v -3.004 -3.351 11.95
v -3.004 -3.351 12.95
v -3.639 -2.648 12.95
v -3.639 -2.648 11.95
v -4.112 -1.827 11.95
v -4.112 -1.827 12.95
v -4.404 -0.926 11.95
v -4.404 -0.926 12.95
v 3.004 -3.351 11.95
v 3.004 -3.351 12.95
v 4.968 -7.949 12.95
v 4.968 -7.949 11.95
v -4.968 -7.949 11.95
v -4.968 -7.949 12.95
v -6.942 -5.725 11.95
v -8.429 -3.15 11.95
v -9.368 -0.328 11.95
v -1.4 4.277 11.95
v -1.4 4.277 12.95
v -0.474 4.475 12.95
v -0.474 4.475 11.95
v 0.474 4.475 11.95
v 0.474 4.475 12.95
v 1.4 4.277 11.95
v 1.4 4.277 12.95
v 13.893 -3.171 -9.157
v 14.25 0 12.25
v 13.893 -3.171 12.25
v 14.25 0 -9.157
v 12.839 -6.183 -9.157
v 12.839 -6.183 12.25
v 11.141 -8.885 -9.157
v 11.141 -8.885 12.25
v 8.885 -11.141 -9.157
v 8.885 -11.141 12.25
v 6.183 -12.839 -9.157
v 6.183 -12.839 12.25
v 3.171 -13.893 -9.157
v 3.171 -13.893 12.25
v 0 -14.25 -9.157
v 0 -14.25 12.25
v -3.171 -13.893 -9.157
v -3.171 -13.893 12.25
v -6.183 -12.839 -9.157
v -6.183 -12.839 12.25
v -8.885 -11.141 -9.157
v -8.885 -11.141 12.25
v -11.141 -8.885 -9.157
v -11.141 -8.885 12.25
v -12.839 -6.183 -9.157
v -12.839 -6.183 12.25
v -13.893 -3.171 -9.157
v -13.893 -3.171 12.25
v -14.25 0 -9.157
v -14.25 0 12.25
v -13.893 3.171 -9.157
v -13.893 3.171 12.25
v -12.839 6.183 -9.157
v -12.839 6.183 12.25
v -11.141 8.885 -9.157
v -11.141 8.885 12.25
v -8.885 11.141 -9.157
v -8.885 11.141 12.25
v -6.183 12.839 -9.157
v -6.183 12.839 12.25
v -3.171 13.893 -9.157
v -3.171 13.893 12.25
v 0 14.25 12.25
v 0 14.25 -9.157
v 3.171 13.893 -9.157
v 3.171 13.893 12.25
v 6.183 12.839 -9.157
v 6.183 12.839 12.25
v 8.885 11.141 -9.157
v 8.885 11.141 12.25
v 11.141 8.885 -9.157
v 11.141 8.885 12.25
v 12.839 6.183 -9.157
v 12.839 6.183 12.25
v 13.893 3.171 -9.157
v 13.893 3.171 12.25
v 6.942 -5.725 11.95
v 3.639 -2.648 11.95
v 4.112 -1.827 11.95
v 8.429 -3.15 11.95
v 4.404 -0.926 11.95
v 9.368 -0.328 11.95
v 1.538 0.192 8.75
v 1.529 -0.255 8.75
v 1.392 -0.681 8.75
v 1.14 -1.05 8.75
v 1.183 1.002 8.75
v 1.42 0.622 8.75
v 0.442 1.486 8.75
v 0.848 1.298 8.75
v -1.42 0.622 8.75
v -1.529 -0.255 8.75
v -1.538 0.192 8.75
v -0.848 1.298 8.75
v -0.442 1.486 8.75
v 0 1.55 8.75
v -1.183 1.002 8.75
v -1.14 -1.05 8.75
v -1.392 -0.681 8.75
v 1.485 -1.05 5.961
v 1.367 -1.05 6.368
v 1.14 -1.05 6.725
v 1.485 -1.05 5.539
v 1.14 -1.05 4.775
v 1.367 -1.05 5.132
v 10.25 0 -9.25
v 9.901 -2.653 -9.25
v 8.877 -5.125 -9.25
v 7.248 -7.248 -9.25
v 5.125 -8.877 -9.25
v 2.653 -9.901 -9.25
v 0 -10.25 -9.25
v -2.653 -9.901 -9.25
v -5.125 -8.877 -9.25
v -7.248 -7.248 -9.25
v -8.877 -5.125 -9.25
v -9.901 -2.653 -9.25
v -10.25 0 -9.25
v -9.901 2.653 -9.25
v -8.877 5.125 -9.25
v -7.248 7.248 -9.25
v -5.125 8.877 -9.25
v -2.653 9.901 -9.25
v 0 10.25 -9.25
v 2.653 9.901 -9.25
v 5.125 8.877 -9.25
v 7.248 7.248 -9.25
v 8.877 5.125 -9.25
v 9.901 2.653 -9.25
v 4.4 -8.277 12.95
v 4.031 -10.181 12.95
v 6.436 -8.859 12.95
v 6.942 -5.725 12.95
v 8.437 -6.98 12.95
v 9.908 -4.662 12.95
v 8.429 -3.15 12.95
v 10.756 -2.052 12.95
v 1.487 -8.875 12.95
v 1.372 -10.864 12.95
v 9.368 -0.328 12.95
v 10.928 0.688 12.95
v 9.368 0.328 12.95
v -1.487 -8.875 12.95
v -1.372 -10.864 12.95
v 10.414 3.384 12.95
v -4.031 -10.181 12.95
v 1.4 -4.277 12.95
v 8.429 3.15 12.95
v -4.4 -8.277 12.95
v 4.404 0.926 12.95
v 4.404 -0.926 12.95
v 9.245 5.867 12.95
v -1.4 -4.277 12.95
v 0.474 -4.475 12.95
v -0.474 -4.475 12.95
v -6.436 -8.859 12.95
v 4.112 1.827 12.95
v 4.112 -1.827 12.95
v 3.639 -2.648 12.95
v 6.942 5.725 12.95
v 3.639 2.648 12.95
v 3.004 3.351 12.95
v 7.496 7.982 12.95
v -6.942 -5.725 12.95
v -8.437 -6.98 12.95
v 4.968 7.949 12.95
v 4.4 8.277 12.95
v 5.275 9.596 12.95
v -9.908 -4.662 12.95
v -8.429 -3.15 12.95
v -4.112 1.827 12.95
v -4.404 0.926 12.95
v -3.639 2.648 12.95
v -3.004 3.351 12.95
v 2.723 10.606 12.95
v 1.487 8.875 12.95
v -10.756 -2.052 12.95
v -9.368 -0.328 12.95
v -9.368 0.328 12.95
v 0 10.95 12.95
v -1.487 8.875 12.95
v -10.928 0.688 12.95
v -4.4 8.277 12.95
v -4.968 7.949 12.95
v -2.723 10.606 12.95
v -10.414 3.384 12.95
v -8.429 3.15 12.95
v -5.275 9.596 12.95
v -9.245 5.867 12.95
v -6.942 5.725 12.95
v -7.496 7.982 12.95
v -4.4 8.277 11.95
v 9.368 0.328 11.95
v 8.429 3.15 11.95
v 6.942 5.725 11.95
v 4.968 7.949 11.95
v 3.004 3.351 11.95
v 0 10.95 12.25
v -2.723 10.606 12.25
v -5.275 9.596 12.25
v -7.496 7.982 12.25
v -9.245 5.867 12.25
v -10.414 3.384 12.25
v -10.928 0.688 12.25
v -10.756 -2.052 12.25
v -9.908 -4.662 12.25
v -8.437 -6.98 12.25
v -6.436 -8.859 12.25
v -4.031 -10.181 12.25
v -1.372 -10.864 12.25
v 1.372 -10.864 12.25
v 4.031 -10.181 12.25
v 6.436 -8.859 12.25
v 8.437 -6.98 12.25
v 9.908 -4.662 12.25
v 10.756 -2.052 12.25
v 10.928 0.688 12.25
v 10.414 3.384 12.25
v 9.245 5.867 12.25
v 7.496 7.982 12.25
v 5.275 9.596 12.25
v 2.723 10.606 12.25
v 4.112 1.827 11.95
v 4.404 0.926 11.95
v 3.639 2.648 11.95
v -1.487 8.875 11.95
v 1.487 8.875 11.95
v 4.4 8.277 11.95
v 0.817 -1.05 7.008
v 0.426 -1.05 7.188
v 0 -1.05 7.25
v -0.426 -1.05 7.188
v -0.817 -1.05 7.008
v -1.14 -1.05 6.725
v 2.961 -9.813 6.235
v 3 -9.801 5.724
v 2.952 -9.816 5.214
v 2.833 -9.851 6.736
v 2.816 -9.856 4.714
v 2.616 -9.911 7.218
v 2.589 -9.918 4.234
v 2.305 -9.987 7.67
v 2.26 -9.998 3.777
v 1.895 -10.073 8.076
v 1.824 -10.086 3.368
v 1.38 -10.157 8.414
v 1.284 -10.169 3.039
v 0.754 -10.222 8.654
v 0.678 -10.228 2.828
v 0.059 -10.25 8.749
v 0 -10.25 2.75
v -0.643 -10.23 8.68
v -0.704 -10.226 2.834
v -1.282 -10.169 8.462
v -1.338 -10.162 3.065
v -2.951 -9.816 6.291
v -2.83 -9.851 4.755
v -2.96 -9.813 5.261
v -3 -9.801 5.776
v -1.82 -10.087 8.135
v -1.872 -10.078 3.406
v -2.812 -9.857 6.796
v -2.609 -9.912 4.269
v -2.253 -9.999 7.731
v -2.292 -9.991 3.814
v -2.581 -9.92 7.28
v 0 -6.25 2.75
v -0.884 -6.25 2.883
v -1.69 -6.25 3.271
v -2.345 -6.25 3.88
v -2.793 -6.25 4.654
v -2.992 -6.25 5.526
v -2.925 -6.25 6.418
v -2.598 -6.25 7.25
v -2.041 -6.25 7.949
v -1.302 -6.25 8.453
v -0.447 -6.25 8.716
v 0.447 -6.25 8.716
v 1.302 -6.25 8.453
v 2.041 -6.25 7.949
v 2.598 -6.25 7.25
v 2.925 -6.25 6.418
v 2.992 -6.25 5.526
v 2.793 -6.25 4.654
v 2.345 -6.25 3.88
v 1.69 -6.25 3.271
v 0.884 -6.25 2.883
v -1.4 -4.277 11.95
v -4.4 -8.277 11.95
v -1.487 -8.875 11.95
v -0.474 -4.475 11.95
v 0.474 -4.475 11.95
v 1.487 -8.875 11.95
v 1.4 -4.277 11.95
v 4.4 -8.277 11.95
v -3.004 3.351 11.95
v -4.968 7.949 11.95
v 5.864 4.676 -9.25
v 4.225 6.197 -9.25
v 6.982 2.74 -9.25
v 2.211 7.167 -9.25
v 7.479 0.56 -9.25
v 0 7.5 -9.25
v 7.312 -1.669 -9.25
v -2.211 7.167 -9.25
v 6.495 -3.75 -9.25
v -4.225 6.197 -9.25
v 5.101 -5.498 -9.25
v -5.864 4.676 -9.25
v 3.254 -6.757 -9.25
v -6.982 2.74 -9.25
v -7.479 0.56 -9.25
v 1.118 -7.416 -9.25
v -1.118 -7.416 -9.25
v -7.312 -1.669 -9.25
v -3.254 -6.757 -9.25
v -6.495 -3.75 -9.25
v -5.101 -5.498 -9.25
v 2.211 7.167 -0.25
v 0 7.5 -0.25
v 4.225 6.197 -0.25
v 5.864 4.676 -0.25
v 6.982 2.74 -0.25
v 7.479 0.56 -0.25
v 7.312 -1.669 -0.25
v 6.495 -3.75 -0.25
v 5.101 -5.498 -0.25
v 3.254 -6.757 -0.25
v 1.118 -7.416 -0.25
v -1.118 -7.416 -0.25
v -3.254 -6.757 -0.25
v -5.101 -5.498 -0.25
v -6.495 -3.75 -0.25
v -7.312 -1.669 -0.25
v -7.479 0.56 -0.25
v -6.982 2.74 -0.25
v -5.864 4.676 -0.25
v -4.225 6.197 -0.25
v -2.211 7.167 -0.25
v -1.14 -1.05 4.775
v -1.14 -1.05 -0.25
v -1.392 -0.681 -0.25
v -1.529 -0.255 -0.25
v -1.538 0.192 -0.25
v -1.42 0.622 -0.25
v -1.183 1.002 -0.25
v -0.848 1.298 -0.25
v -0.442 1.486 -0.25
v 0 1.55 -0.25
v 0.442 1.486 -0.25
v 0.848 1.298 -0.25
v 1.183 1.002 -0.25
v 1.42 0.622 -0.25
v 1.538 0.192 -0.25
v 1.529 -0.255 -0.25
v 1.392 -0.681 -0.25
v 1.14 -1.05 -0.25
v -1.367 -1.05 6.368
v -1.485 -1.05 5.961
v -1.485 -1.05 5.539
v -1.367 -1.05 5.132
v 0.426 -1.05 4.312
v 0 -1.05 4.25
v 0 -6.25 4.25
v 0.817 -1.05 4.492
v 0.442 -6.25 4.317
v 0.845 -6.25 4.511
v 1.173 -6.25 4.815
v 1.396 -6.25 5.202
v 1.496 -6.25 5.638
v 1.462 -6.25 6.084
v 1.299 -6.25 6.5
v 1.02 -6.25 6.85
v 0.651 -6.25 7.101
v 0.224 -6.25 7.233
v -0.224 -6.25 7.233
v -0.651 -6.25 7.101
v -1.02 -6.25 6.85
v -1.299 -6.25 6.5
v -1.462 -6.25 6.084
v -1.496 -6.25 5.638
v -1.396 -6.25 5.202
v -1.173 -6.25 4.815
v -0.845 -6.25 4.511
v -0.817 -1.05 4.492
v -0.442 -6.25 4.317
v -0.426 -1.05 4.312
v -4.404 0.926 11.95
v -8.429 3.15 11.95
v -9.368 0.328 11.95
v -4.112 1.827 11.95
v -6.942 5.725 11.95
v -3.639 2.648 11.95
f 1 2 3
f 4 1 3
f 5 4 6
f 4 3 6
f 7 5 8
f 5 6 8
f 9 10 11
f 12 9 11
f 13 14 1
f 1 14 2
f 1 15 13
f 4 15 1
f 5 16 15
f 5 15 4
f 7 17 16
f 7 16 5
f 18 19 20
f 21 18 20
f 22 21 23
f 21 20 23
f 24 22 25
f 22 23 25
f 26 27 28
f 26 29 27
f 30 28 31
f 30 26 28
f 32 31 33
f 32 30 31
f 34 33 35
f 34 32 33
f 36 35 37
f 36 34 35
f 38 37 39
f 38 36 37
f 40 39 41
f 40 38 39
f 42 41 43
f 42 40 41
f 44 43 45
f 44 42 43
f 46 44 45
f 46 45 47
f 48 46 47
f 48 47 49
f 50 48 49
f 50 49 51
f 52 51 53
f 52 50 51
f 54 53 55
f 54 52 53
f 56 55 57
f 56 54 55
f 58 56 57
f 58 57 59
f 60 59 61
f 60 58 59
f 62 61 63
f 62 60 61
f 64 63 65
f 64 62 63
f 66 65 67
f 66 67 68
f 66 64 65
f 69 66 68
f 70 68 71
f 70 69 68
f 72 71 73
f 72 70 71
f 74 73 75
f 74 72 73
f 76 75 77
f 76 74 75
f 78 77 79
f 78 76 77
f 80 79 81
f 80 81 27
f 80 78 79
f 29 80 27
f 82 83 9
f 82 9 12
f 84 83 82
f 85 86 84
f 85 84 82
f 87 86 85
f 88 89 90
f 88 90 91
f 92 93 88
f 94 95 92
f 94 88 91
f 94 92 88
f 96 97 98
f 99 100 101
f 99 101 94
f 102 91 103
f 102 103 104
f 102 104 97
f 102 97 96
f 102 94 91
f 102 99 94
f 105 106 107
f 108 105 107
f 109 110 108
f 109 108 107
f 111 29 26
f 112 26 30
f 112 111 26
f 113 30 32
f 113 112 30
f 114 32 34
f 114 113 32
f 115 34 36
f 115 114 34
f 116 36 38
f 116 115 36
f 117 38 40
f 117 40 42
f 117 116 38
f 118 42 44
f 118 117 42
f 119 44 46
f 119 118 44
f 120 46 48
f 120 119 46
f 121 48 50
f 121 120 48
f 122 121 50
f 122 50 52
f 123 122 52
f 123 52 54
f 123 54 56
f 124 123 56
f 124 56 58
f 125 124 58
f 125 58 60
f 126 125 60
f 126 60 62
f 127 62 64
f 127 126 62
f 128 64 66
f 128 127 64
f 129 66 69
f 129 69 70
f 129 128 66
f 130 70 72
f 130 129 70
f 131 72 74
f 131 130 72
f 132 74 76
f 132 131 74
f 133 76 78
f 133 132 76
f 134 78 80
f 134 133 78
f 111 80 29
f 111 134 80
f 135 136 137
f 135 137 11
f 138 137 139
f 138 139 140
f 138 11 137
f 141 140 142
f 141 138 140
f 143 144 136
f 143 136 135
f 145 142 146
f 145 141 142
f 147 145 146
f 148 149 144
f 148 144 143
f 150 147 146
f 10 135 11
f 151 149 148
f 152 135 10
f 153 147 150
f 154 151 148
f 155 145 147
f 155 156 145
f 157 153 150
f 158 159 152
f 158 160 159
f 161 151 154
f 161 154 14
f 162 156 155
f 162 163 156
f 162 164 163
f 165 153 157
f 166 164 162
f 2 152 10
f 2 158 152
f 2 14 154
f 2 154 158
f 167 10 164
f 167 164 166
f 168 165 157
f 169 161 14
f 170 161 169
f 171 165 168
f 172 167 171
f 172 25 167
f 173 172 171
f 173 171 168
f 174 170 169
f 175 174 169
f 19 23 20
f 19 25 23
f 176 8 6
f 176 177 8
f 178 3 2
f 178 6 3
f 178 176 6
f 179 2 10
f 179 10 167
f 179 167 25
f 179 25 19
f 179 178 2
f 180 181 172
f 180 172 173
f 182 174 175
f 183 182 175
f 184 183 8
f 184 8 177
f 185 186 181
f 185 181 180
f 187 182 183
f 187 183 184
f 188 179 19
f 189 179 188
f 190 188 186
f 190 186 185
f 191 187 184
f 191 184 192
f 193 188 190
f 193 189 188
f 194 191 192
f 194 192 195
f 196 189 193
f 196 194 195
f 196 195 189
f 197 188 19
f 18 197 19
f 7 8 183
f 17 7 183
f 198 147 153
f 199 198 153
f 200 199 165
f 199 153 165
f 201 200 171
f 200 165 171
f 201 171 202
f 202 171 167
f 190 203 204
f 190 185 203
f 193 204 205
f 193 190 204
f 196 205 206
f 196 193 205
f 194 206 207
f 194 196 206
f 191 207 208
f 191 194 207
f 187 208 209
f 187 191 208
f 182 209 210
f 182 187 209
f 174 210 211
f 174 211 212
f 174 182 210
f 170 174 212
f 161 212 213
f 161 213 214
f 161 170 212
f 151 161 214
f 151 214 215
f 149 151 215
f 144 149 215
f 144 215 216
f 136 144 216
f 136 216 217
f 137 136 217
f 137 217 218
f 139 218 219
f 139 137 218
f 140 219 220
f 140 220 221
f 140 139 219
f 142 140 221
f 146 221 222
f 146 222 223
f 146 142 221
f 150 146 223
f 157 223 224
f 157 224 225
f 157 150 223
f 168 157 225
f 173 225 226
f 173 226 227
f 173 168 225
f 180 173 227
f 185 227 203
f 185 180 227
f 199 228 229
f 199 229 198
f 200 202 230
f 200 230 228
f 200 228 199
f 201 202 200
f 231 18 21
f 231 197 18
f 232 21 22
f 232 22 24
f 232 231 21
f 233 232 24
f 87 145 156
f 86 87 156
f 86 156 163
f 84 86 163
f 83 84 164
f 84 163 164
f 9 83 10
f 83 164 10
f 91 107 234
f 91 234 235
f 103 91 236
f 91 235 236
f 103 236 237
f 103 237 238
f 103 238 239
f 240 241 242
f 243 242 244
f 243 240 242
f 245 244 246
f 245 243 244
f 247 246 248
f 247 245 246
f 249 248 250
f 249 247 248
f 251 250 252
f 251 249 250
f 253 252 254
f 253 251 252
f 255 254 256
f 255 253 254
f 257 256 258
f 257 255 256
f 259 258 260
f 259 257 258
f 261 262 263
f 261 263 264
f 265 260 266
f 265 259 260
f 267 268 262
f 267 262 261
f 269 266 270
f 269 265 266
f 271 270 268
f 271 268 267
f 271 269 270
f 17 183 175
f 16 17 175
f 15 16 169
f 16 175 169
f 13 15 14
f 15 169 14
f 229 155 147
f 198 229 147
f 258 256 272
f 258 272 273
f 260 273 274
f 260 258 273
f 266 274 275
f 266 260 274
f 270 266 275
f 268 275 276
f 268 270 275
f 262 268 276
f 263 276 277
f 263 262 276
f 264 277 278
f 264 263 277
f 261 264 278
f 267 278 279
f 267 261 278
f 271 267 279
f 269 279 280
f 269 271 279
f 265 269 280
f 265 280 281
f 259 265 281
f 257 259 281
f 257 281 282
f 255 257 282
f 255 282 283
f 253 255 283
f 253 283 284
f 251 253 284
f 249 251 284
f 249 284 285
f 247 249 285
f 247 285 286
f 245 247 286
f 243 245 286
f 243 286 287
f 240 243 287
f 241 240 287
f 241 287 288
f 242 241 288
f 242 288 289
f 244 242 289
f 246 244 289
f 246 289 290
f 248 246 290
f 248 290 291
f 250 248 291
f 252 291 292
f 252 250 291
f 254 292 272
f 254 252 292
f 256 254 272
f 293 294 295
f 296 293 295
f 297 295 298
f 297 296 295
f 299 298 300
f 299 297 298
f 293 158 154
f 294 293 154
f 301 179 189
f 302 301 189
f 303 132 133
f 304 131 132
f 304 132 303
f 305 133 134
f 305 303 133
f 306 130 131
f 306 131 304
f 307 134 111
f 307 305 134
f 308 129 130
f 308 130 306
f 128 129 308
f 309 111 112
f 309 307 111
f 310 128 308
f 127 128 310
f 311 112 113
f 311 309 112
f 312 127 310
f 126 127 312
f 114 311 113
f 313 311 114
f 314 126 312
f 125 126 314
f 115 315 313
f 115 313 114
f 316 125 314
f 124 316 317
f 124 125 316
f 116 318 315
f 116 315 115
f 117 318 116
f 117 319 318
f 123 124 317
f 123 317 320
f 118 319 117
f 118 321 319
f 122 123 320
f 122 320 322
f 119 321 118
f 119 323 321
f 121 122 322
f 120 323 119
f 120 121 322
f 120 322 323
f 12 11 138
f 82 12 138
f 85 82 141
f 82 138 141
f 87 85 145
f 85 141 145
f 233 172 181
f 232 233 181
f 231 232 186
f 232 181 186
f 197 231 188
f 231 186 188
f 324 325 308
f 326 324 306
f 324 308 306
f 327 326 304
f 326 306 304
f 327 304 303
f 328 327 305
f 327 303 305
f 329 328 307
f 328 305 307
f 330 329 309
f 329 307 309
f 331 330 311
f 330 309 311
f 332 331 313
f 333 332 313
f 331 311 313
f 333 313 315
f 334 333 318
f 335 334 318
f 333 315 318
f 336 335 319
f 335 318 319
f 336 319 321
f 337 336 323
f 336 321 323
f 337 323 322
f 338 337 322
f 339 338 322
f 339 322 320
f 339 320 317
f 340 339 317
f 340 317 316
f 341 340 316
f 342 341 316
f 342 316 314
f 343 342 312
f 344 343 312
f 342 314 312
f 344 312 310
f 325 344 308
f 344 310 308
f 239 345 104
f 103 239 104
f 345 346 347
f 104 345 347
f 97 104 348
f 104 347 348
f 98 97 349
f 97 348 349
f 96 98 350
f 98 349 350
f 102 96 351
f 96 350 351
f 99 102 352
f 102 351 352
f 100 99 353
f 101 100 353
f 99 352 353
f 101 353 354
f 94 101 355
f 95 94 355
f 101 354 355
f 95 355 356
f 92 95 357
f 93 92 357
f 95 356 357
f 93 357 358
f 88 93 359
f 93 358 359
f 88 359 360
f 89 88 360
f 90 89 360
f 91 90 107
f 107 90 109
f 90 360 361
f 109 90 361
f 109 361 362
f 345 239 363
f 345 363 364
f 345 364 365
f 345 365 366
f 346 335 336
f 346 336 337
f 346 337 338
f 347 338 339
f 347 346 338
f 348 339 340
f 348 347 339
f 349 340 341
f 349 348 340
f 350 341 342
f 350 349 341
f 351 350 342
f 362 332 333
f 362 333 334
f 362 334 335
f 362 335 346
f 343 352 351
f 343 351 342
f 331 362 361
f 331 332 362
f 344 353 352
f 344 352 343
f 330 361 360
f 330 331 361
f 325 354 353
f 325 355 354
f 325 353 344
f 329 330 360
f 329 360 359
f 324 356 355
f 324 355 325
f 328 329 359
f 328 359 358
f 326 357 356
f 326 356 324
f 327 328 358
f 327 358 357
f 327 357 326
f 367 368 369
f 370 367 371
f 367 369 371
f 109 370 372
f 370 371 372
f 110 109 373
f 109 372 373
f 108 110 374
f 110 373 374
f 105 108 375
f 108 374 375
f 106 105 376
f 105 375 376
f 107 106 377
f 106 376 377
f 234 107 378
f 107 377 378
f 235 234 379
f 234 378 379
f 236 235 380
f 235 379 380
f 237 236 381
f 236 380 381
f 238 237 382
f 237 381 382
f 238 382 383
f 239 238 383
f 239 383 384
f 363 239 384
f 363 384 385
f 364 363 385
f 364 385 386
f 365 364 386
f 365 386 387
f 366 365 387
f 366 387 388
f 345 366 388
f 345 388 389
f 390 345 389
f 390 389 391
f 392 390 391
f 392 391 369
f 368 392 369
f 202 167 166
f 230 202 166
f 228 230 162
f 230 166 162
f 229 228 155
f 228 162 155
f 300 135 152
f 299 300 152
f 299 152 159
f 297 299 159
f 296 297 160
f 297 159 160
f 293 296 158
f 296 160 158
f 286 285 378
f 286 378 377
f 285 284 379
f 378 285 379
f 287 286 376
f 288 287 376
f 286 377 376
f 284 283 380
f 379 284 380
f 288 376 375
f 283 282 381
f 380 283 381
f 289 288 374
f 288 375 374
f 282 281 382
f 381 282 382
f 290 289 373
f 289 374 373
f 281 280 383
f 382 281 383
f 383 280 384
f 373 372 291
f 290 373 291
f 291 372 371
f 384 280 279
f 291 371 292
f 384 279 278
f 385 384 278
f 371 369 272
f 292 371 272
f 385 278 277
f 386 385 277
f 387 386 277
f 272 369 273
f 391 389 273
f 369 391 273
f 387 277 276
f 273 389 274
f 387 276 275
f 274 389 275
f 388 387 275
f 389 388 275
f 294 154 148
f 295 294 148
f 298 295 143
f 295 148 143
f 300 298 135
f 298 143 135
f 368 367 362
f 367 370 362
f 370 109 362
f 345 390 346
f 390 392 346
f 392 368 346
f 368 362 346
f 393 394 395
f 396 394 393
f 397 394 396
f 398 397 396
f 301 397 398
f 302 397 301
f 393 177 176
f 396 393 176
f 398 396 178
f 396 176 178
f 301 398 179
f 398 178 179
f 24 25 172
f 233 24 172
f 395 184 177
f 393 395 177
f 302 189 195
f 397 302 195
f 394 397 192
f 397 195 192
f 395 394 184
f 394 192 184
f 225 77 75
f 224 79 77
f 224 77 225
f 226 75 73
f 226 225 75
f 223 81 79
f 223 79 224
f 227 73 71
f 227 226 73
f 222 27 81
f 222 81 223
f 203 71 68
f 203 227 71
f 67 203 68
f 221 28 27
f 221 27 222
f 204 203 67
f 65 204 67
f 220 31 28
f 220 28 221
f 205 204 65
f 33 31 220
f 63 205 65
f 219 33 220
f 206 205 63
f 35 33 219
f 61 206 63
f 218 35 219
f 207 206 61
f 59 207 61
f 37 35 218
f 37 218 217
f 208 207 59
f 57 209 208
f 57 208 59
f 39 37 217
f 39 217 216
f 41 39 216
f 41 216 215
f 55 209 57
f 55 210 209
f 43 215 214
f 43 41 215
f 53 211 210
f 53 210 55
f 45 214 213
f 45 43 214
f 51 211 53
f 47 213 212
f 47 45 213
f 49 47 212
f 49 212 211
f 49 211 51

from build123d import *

# Parameters (mm, degrees)
CORTAR_EXTRUIR4_DEPTH      = 1
CROQUIS7_R                 = 7.5
CORTAR_EXTRUIR5_DEPTH      = 9
CORTAR_EXTRUIR6_DEPTH      = 9
CORTAR_EXTRUIR8_DEPTH      = 5
CORTAR_EXTRUIR8_DEPTH_BACK = 28.93644573
CROQUIS10_R                = 3
CROQUIS11_R                = 1.5
CORTAR_EXTRUIR9_DEPTH      = 5.2


with BuildPart() as part:
    # Croquis1 → Revolución1 (revolve)
    with BuildSketch(Plane(origin=(0, 0, 0), x_dir=(0, 0, -1), z_dir=(1, 0, 0))):
        Polygon((0, 0), (9.25, 0), (9.25, 10.25), (-12.25, 10.25), (-12.25, 10.95), (-12.95, 10.95), (-12.95, 0), align=None)
    revolve(axis=Axis((0, 0, 0), (0, 0, 1)))

    # Croquis5 → Cortar-Extruir4 (cut)
    with BuildSketch(Plane.XY.offset(12.95)):
        with BuildLine():
            ThreePointArc((-1.4, 4.276680956), (0, 4.5), (1.4, 4.276680956))
            Line((1.4, 4.276680956), (4.4, 8.276680956))
            ThreePointArc((4.4, 8.276680956), (0, 8.95), (-4.4, 8.276680956))
            Line((-4.4, 8.276680956), (-1.4, 4.276680956))
        make_face()
        with BuildLine():
            Line((4.967815967, 7.948852255), (3.003714352, 3.350776043))
            ThreePointArc((3.003714352, 3.350776043), (3.897114317, 2.25), (4.403714352, 0.925904913))
            Line((4.403714352, 0.925904913), (9.367815967, 0.327828701))
            ThreePointArc((9.367815967, 0.327828701), (7.750927364, 4.475), (4.967815967, 7.948852255))
        make_face()
        with BuildLine():
            Line((9.367815967, -0.327828701), (4.403714352, -0.925904913))
            ThreePointArc((4.403714352, -0.925904913), (3.897114317, -2.25), (3.003714352, -3.350776043))
            Line((3.003714352, -3.350776043), (4.967815967, -7.948852255))
            ThreePointArc((4.967815967, -7.948852255), (7.750927364, -4.475), (9.367815967, -0.327828701))
        make_face()
        with BuildLine():
            Line((4.4, -8.276680956), (1.4, -4.276680956))
            ThreePointArc((1.4, -4.276680956), (0, -4.5), (-1.4, -4.276680956))
            Line((-1.4, -4.276680956), (-4.4, -8.276680956))
            ThreePointArc((-4.4, -8.276680956), (0, -8.95), (4.4, -8.276680956))
        make_face()
        with BuildLine():
            ThreePointArc((-3.003714352, -3.350776043), (-3.897114317, -2.25), (-4.403714352, -0.925904913))
            Line((-4.403714352, -0.925904913), (-9.367815967, -0.327828701))
            ThreePointArc((-9.367815967, -0.327828701), (-7.750927364, -4.475), (-4.967815967, -7.948852255))
            Line((-4.967815967, -7.948852255), (-3.003714352, -3.350776043))
        make_face()
        with BuildLine():
            ThreePointArc((-4.403714352, 0.925904913), (-3.897114317, 2.25), (-3.003714352, 3.350776043))
            Line((-3.003714352, 3.350776043), (-4.967815967, 7.948852255))
            ThreePointArc((-4.967815967, 7.948852255), (-7.750927364, 4.475), (-9.367815967, 0.327828701))
            Line((-9.367815967, 0.327828701), (-4.403714352, 0.925904913))
        make_face()
    extrude(amount=-CORTAR_EXTRUIR4_DEPTH, mode=Mode.SUBTRACT)

    # Croquis7 → Cortar-Extruir5 (cut)
    with BuildSketch(Plane(origin=(0, 0, -9.25), x_dir=(-1, 0, 0), z_dir=(0, 0, -1))):
        with Locations(Location((0, 0, 0), (0, 0, 90))):
            Circle(CROQUIS7_R)
    extrude(amount=-CORTAR_EXTRUIR5_DEPTH, mode=Mode.SUBTRACT)

    # Croquis8 → Cortar-Extruir6 (cut)
    with BuildSketch(Plane(origin=(0, 0, -0.25), x_dir=(-1, 0, 0), z_dir=(0, 0, -1))):
        with BuildLine():
            Line((-1.140175425, -1.05), (1.140175425, -1.05))
            ThreePointArc((1.140175425, -1.05), (0, 1.55), (-1.140175425, -1.05))
        make_face()
    extrude(amount=-CORTAR_EXTRUIR6_DEPTH, mode=Mode.SUBTRACT)

    # Croquis10 → Cortar-Extruir8 (cut, two sides: drawn at the far end of the back side and taken through both)
    with BuildSketch(Plane(origin=(0, -11.25, 0), x_dir=(1, 0, 0), z_dir=(0, 1, 0)).offset(-CORTAR_EXTRUIR8_DEPTH_BACK)):
        with Locations(Location((0, -5.75, 0), (0, 0, 90))):
            Circle(CROQUIS10_R)
    extrude(amount=CORTAR_EXTRUIR8_DEPTH + CORTAR_EXTRUIR8_DEPTH_BACK, mode=Mode.SUBTRACT)

    # Croquis11 → Cortar-Extruir9 (cut)
    with BuildSketch(Plane.XZ.offset(6.25)):
        with Locations(Location((0, 5.75, 0), (0, 0, 270))):
            Circle(CROQUIS11_R)
    extrude(amount=-CORTAR_EXTRUIR9_DEPTH, mode=Mode.SUBTRACT)

    # Croquis12 → Revolución3 (revolve)
    with BuildSketch(Plane(origin=(0, 0, 0), x_dir=(0, 0, -1), z_dir=(1, 0, 0)), mode=Mode.PRIVATE) as revoluci_n3_sk:
        Polygon((-12.25, 10.25), (-12.25, 14.25), (9.156518587, 14.25), (9.25, 10.25), align=None)
    revolve(revoluci_n3_sk.sketch.rotate(Axis((0, 0, 0), (0, 0, -1)), 90), axis=Axis((0, 0, 0), (0, 0, -1)))


solid = part.part
